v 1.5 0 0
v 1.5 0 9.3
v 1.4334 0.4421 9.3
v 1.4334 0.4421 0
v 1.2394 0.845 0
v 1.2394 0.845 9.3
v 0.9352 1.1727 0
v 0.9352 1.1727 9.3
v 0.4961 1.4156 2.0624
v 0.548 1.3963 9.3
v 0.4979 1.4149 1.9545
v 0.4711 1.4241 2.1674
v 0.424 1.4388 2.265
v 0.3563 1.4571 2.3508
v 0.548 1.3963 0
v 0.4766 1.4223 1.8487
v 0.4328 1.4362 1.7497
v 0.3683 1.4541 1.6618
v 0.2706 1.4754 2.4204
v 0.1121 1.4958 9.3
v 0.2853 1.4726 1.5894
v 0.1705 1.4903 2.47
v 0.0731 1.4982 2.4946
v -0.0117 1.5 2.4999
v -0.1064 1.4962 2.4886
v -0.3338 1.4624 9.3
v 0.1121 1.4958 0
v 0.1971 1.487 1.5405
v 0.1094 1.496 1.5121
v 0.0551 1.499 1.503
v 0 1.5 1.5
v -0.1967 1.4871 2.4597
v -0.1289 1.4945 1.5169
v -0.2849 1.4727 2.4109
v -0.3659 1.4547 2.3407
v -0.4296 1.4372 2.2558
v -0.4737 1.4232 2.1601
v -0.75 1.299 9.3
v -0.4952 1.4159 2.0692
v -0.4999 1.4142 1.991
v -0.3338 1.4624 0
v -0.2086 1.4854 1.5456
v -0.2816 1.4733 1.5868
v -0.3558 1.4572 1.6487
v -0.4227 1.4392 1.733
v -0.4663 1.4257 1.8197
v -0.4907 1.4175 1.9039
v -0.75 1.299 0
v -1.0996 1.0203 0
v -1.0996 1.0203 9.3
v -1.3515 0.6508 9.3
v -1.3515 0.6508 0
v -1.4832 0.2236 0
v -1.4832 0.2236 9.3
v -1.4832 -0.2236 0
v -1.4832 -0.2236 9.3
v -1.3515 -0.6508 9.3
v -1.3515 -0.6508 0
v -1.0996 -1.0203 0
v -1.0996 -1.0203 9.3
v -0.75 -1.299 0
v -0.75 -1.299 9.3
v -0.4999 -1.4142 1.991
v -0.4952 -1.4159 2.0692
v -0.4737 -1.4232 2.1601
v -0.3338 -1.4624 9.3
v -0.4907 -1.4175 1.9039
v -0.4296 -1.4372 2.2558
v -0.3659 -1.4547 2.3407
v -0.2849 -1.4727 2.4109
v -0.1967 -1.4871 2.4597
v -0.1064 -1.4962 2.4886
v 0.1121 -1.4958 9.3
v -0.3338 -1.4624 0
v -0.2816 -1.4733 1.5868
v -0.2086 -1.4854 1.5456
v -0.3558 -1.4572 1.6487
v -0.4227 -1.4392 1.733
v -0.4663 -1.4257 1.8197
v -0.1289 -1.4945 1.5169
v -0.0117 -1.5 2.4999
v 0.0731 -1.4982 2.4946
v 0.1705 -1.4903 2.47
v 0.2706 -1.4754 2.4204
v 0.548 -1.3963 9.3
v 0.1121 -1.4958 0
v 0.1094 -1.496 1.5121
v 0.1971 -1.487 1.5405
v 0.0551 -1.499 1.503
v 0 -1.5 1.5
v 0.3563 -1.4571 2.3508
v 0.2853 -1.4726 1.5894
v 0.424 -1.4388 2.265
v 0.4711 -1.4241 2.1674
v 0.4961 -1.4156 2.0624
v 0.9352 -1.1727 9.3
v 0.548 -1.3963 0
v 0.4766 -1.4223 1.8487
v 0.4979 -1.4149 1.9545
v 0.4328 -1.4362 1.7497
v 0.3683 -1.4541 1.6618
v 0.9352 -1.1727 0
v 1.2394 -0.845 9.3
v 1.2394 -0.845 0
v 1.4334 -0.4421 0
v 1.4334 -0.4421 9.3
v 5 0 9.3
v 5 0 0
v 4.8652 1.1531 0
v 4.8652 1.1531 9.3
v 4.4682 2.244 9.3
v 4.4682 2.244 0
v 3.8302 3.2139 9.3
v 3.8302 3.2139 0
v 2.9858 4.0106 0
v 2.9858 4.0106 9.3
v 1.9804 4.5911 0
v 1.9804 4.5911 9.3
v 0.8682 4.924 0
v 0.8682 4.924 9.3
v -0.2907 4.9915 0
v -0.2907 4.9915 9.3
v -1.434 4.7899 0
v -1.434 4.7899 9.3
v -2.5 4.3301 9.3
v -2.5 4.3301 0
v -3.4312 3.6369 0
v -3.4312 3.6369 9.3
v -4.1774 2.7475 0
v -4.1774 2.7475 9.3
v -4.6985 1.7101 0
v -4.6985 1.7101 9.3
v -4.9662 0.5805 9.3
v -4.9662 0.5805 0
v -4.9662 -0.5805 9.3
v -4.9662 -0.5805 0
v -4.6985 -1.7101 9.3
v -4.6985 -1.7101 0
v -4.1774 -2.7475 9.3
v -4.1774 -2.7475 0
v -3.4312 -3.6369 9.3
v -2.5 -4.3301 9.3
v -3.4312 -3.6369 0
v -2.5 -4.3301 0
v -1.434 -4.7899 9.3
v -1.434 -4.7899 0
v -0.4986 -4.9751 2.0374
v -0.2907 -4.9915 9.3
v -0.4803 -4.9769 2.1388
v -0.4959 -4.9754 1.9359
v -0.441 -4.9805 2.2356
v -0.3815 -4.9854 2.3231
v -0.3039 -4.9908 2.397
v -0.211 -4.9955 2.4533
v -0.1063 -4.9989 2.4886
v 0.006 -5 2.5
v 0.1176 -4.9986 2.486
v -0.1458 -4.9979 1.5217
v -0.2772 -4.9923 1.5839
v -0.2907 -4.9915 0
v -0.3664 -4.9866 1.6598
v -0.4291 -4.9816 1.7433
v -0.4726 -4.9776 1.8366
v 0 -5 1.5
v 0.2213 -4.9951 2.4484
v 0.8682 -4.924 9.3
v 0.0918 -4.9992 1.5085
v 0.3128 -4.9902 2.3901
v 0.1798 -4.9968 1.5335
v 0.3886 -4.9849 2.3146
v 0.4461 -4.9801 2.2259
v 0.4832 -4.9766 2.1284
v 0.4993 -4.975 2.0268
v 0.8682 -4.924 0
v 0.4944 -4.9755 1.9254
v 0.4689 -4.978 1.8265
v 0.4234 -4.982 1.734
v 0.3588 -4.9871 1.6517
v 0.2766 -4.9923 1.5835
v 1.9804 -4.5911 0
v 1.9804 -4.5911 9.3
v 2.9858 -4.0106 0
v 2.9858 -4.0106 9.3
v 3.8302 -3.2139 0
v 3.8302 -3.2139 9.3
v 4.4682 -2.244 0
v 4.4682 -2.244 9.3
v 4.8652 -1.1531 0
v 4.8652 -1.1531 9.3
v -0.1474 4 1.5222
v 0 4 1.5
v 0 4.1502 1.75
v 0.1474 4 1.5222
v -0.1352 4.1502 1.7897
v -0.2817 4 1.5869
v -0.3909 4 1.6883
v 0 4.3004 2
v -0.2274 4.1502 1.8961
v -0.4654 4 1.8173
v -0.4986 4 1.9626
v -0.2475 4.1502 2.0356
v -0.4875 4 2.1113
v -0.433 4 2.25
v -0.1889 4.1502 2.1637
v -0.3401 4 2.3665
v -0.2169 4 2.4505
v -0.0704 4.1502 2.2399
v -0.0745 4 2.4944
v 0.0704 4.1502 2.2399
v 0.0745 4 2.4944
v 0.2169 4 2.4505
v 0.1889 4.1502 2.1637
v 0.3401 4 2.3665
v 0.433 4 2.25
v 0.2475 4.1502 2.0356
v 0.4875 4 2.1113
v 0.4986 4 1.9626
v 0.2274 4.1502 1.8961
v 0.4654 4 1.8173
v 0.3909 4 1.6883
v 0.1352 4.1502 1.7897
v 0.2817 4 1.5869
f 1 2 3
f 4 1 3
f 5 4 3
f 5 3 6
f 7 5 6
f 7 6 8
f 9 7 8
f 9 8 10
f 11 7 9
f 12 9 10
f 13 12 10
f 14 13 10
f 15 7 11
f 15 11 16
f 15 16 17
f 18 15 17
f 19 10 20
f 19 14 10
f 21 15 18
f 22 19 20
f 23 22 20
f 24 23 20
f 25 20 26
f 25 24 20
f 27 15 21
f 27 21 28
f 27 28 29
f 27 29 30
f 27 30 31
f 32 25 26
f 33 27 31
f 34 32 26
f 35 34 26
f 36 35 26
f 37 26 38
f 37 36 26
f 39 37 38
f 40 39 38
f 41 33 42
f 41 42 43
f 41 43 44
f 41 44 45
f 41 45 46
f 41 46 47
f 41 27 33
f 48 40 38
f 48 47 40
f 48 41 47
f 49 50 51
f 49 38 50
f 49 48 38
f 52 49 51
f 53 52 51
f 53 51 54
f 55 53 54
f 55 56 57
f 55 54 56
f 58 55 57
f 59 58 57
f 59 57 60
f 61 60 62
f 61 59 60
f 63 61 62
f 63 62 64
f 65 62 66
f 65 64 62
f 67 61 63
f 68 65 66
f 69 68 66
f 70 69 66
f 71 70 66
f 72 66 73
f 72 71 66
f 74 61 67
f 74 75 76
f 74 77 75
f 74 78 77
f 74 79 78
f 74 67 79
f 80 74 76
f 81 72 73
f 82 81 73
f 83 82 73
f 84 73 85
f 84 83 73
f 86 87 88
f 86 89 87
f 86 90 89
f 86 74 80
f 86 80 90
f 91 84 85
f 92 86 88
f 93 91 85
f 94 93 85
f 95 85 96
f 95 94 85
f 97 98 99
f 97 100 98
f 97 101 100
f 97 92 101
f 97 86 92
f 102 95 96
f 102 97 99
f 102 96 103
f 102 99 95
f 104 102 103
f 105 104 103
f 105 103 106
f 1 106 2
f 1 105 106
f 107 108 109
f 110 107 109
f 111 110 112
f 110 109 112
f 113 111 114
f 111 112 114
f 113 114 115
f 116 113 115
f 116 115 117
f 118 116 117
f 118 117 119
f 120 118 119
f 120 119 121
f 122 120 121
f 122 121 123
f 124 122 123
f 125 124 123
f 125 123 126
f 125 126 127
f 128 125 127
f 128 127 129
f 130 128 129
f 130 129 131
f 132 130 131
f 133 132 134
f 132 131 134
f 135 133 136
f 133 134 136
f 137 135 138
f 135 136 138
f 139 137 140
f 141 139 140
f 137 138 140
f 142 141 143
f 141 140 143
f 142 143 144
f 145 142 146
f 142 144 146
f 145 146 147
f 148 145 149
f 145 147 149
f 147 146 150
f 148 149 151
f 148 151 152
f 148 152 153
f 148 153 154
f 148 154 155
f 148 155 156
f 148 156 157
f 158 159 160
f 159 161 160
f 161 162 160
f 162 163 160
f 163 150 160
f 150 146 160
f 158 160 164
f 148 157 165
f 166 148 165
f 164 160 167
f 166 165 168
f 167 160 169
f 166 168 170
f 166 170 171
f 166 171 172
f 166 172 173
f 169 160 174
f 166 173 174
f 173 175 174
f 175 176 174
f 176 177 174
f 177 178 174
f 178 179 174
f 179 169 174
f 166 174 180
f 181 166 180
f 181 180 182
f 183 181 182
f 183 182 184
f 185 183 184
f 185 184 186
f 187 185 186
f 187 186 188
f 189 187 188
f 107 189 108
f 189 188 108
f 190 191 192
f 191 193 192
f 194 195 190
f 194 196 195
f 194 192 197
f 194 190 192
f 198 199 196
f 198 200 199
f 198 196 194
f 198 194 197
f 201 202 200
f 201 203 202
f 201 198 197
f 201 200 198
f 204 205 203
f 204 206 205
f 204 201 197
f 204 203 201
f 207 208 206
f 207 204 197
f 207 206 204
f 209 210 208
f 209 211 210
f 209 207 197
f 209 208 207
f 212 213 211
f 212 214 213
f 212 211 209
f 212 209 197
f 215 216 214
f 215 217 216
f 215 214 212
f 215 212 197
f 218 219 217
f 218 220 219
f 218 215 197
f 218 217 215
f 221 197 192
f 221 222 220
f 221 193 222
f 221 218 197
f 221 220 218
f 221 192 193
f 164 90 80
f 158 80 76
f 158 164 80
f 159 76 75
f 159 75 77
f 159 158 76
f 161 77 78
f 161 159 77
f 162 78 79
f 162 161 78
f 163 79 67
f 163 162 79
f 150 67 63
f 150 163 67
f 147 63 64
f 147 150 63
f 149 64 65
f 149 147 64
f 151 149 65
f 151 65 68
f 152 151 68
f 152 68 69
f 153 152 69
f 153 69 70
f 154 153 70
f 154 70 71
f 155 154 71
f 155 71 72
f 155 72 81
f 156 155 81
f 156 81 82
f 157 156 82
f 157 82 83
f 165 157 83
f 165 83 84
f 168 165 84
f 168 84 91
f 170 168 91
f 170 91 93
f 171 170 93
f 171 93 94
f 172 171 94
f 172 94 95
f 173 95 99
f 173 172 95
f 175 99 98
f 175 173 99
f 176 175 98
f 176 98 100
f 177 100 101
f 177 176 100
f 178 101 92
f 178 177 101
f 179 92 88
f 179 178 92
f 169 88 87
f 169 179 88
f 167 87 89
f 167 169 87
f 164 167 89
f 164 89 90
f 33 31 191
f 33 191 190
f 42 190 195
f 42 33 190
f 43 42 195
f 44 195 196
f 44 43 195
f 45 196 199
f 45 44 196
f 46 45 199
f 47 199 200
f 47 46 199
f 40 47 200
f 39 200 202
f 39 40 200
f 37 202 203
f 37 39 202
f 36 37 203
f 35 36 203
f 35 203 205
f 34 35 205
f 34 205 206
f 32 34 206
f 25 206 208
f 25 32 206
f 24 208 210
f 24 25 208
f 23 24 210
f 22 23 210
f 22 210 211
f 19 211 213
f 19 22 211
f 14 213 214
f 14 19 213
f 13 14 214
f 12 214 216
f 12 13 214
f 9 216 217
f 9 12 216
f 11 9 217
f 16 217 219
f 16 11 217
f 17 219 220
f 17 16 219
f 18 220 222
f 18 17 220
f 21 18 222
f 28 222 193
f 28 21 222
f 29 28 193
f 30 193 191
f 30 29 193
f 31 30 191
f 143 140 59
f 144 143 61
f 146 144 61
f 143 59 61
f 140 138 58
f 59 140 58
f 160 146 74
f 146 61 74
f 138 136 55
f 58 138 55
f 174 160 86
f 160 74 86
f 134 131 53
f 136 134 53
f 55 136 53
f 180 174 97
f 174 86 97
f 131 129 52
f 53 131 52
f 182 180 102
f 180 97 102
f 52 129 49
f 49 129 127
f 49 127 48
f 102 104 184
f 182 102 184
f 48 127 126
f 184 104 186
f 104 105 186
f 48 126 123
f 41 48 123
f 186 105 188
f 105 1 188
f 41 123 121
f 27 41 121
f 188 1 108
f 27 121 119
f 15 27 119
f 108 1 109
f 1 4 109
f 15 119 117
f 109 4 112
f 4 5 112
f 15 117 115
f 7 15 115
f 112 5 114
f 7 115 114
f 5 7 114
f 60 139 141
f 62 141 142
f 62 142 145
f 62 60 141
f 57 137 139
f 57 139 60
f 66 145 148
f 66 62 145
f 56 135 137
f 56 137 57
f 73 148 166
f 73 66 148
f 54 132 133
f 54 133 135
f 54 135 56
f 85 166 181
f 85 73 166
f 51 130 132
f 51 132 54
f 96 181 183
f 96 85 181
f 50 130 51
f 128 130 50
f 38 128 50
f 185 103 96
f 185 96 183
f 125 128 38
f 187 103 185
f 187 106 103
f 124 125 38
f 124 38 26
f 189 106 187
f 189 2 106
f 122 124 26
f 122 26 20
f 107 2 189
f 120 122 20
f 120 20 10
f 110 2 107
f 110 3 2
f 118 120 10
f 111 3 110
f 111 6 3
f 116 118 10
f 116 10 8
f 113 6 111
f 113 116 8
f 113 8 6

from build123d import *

# Parameters (mm, degrees)
SKIZZE1_R                            = 5
AUFSATZ_LINEAR_AUSTRAGEN1_DEPTH      = 9.3
SCHNITT_LINEAR_AUSTRAGEN1_DEPTH      = 12.682893477
SCHNITT_LINEAR_AUSTRAGEN1_DEPTH_BACK = 12.682893477
SKIZZE2_R                            = 1.5
SCHNITT_LINEAR_START                 = -10
SKIZZE9_R                            = 0.5
SCHNITT_LINEAR_AUSTRAGEN2_DEPTH      = 10


with BuildPart() as part:
    # Skizze1 → Aufsatz-Linear austragen1 (new body)
    with BuildSketch(Plane.XY):
        Circle(SKIZZE1_R)
    extrude(amount=AUFSATZ_LINEAR_AUSTRAGEN1_DEPTH)

    # Skizze2 → Schnitt-Linear austragen1 (cut, two sides: drawn at the far end of the back side and taken through both)
    with BuildSketch(Plane.XY.offset(9.3).offset(-SCHNITT_LINEAR_AUSTRAGEN1_DEPTH_BACK)):
        Circle(SKIZZE2_R)
    extrude(amount=SCHNITT_LINEAR_AUSTRAGEN1_DEPTH + SCHNITT_LINEAR_AUSTRAGEN1_DEPTH_BACK, mode=Mode.SUBTRACT)

    # Skizze8 → Ø1.0 (1) Durchmesser Bohrung3 (revolve, cut)
    with BuildSketch(Plane(origin=(0, 0, 2), x_dir=(0, 0, -1), z_dir=(1, 0, 0))):
        Polygon((0, 0), (0, 4.30043031), (0.5, 4), (0.5, 0), align=None)
    revolve(axis=Axis((0, -6.35, 2), (0, 1, 0)), mode=Mode.SUBTRACT)

    # Skizze9 → Schnitt-Linear austragen2 (cut)
    with BuildSketch(Plane(origin=(0, 0, 0), x_dir=(1, 0, 0), z_dir=(0, 1, 0)).offset(SCHNITT_LINEAR_START)):
        with Locations(Location((0, -2, 0), (0, 0, 90))):
            Circle(SKIZZE9_R)
    extrude(amount=SCHNITT_LINEAR_AUSTRAGEN2_DEPTH, mode=Mode.SUBTRACT)


solid = part.part
